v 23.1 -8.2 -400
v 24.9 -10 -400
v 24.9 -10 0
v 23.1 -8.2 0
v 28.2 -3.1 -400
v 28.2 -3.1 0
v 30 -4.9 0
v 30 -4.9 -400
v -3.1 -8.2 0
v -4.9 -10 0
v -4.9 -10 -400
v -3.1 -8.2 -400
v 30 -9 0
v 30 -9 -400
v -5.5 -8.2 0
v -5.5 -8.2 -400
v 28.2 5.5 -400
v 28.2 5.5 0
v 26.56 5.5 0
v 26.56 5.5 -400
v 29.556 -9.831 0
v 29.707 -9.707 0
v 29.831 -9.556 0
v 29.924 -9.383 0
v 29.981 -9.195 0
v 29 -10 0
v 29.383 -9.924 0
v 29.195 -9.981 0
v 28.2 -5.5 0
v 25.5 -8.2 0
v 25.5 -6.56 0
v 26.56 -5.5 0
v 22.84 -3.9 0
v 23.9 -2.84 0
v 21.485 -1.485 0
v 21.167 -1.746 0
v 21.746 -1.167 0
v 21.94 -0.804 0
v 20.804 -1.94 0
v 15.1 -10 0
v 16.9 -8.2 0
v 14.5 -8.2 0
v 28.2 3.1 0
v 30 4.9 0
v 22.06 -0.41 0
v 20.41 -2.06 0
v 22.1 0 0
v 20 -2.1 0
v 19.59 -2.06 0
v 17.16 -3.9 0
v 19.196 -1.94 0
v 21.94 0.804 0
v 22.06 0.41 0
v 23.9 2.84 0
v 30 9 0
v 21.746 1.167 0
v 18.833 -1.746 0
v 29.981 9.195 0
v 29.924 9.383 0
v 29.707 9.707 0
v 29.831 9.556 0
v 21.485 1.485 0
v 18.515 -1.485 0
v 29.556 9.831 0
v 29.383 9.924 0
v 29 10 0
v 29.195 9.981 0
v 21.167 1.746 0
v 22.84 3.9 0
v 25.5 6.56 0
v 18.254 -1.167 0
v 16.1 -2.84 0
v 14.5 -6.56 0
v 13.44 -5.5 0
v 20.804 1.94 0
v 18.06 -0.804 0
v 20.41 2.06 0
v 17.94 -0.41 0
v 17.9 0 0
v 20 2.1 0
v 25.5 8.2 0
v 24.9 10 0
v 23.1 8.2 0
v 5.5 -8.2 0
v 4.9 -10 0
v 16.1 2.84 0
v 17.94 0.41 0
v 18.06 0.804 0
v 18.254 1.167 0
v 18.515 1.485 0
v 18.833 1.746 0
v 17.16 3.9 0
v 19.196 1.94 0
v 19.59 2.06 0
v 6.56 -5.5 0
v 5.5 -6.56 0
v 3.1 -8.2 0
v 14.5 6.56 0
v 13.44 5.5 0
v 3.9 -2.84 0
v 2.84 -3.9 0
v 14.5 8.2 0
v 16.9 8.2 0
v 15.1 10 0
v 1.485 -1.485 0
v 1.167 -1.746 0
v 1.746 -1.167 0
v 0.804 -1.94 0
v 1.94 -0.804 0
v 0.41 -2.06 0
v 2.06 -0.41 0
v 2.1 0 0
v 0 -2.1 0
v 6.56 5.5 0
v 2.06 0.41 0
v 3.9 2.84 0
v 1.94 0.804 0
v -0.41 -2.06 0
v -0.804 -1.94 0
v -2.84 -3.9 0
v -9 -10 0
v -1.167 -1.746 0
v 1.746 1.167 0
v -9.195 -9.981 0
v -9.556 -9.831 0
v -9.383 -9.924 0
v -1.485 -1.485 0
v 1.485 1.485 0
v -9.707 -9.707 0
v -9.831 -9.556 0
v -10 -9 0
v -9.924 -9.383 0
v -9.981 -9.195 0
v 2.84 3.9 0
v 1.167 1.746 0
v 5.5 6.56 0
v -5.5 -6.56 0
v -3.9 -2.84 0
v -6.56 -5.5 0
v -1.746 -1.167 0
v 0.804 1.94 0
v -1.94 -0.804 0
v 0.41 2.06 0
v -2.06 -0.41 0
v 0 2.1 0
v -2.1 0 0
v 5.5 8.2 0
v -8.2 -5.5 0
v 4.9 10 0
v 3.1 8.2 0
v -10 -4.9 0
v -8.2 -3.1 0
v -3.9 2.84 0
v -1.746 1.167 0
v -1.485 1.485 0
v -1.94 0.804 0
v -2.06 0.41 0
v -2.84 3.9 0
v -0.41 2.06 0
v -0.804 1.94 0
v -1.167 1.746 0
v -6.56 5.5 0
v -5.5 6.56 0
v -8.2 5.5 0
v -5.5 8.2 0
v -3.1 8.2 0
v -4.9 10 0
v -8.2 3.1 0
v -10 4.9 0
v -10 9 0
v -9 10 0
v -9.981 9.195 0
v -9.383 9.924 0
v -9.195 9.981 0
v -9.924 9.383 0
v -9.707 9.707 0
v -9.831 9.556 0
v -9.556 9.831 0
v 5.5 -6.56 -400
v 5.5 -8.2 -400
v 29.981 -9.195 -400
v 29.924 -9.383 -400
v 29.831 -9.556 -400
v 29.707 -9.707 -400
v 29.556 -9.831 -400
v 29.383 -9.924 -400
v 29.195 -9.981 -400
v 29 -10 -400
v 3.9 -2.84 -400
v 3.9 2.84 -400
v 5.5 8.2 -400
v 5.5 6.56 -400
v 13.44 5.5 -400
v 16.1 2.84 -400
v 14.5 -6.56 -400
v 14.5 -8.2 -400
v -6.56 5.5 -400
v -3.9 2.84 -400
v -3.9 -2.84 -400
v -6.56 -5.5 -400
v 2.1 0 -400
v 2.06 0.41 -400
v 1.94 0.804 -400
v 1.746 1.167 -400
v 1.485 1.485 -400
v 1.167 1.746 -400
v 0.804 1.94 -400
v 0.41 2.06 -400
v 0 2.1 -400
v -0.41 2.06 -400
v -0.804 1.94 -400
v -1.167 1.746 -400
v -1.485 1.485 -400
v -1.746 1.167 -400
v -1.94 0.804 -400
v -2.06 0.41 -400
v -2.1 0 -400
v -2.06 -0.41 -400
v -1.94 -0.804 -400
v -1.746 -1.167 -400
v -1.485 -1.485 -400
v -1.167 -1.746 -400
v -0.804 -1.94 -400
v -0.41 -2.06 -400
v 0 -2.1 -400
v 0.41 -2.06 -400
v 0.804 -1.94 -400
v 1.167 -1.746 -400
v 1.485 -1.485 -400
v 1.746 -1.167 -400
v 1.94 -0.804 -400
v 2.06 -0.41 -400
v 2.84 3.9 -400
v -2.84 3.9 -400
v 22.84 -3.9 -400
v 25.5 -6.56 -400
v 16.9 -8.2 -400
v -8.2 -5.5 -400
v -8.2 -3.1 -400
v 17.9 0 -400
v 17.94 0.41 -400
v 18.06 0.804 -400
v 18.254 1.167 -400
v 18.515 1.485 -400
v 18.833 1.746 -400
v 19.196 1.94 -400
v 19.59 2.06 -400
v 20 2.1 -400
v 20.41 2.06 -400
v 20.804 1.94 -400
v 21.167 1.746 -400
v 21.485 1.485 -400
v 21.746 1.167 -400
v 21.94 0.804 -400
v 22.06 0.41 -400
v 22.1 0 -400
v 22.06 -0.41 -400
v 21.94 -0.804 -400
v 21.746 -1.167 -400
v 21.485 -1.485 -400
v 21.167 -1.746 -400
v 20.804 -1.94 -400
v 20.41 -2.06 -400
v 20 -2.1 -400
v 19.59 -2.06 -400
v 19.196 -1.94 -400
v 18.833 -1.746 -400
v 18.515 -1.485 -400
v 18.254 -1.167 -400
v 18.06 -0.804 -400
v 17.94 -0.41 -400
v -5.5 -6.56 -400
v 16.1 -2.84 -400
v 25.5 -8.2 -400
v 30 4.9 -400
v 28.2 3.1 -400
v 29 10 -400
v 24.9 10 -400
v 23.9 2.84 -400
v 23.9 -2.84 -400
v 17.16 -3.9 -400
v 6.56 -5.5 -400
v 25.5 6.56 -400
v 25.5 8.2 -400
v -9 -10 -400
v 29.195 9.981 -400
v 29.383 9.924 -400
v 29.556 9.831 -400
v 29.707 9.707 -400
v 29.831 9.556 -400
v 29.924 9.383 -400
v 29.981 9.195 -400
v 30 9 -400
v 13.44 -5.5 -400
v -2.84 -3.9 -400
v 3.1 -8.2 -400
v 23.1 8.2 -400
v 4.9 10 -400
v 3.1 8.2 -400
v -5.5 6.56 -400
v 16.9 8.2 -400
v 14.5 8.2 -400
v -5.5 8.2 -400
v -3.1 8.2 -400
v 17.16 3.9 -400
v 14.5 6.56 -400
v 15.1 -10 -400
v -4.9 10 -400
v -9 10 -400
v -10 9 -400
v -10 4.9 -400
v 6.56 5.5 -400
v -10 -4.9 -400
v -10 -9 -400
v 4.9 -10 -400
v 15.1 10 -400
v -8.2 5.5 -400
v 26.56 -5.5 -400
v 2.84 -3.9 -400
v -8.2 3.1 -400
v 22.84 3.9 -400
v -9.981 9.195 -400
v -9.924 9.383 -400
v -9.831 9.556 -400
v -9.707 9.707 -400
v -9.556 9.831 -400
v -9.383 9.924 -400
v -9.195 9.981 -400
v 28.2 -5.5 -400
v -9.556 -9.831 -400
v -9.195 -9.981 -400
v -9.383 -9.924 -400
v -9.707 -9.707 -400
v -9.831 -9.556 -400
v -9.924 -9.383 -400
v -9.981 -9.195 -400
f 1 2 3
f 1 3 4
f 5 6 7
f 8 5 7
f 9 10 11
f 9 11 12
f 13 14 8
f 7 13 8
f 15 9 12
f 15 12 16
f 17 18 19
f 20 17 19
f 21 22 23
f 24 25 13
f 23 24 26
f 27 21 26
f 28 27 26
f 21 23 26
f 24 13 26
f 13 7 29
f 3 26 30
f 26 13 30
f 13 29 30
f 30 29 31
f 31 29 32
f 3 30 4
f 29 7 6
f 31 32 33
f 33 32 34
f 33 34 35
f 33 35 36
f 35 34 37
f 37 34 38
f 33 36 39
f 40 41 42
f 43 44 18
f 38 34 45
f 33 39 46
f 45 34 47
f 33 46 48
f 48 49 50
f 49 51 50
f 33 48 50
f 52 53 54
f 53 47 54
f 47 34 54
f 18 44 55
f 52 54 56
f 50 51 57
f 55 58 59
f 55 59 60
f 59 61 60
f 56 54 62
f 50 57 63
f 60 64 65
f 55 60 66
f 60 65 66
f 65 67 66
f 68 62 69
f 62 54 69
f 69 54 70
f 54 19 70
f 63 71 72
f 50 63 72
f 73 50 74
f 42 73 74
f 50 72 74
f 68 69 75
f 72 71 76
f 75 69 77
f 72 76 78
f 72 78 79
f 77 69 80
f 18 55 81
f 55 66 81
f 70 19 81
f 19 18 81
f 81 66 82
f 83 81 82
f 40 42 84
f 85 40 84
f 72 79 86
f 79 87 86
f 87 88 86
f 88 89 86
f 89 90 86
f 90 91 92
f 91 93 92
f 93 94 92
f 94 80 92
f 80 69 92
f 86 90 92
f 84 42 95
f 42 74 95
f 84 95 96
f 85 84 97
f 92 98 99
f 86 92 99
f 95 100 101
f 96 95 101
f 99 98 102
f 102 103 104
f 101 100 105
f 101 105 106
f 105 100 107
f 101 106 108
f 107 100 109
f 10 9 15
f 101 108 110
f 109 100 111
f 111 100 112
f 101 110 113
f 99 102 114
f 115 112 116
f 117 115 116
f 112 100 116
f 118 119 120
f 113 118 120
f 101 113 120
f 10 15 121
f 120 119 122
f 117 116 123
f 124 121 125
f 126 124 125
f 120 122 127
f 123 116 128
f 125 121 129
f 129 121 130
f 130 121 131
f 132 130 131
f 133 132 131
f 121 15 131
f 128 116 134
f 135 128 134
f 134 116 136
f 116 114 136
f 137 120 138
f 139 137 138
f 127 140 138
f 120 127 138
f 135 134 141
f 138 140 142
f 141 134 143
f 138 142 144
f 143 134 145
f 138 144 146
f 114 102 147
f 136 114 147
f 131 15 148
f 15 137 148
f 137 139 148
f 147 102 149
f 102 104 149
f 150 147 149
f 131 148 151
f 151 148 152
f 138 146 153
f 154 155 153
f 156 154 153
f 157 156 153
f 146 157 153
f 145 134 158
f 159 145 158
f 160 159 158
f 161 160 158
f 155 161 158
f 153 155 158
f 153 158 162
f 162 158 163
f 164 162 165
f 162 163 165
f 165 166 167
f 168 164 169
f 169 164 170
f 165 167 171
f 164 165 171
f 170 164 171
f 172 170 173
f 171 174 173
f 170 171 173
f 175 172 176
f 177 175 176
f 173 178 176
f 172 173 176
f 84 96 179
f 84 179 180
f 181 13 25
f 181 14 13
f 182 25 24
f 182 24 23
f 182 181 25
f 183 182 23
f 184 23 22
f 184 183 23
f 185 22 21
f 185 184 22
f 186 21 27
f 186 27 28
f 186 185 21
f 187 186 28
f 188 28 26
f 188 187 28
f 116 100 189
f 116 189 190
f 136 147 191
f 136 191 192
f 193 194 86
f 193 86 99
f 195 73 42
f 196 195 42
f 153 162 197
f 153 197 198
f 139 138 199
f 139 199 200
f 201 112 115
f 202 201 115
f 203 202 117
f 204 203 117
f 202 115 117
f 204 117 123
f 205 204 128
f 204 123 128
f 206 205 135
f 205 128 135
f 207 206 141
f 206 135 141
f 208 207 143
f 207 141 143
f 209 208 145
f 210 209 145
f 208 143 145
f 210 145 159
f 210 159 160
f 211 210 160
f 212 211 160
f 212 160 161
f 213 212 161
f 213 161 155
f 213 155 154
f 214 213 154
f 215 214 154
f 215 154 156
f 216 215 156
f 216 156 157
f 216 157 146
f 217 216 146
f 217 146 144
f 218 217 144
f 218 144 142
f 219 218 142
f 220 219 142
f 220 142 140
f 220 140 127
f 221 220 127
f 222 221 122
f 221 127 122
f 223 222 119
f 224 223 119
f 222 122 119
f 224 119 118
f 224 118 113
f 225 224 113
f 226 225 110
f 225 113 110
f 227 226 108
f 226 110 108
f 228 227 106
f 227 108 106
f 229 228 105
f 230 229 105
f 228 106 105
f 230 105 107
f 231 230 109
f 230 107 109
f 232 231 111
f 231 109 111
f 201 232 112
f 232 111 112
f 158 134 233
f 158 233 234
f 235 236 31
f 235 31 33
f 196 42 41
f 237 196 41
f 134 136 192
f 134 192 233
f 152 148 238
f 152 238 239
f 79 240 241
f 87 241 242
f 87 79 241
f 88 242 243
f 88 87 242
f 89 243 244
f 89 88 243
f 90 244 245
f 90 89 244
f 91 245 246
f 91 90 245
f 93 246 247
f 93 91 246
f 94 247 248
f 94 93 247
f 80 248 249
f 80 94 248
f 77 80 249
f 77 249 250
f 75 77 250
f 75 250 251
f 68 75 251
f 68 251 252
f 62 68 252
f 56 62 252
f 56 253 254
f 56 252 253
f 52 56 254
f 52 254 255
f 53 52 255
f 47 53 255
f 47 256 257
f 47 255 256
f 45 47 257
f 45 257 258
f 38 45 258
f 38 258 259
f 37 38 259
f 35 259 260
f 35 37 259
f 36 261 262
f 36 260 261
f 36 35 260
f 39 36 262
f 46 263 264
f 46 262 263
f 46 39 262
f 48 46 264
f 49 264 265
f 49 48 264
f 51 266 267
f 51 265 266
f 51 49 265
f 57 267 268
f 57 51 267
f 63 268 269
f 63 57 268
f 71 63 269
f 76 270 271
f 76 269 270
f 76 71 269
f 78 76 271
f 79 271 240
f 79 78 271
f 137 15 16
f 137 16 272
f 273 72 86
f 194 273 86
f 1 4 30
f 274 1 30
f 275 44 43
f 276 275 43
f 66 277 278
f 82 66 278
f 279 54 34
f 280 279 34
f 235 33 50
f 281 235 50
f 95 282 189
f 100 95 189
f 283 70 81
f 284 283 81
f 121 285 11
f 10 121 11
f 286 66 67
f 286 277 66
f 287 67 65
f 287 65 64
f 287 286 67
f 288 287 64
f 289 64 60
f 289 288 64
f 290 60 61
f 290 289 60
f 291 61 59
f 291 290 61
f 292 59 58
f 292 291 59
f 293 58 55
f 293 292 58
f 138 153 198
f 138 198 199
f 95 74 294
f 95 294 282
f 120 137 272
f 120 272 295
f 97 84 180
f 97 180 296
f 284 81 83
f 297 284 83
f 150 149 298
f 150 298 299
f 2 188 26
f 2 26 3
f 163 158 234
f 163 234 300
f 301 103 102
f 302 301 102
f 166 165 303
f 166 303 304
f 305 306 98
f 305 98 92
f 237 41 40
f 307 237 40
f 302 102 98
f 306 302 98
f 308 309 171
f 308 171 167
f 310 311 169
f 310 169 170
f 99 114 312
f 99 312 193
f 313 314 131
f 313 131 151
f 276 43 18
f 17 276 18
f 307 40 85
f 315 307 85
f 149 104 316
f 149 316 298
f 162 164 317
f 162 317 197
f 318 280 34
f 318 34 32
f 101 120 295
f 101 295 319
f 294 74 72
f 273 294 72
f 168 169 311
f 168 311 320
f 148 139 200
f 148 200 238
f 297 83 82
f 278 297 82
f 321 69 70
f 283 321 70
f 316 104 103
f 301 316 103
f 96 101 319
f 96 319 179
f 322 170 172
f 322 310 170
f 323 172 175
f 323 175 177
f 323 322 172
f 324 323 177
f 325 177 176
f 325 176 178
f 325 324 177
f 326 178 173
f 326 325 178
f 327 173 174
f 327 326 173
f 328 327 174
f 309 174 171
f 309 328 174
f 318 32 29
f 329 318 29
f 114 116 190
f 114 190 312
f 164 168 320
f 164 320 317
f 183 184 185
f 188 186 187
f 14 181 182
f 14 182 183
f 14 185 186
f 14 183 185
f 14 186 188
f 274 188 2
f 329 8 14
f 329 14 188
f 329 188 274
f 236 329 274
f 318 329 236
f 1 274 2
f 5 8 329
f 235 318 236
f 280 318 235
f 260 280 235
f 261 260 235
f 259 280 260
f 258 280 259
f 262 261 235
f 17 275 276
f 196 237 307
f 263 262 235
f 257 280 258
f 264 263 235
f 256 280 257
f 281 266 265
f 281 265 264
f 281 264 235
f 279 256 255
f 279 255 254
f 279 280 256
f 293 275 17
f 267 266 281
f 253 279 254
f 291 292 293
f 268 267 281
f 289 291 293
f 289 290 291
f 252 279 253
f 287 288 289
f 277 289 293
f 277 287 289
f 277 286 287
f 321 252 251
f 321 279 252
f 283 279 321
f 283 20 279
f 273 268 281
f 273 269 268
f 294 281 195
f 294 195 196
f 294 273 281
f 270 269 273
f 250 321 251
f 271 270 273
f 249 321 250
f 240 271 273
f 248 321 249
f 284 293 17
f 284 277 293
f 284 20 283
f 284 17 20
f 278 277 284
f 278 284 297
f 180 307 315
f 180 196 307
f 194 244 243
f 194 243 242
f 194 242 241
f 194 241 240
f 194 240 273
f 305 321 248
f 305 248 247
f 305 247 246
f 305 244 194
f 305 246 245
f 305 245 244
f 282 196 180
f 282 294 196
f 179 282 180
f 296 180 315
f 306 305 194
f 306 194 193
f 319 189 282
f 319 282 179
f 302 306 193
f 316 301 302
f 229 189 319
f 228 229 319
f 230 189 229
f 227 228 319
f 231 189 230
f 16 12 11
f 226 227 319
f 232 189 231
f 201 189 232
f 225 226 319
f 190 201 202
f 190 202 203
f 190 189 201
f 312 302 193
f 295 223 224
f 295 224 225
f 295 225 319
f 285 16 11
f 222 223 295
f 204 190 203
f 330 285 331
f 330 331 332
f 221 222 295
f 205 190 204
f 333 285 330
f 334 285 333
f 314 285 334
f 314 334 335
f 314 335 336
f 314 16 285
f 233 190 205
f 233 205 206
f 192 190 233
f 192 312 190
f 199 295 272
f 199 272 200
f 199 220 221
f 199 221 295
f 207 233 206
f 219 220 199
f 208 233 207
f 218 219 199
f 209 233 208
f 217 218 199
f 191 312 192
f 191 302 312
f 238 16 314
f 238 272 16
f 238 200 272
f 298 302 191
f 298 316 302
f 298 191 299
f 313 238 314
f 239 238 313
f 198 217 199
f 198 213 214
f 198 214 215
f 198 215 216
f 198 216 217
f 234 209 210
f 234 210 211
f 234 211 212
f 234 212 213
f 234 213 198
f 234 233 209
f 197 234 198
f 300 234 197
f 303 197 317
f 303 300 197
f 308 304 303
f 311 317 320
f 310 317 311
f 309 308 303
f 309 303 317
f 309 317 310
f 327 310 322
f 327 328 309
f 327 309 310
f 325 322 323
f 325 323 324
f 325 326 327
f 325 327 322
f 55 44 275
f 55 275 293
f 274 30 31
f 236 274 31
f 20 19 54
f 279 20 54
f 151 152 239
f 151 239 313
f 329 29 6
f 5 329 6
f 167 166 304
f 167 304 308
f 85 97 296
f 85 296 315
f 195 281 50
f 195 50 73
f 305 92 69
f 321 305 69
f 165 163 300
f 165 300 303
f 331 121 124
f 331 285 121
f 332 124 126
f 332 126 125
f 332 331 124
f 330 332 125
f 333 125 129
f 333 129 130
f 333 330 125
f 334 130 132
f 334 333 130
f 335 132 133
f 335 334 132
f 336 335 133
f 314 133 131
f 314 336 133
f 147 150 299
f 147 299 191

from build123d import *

# Parameters (mm, degrees)
SKETCH2_W            = 20
SKETCH2_H            = 20
BOSS_EXTRUDE1_DEPTH  = 400
CUT_EXTRUDE1_DEPTH   = 401.249921924
CIRPATTERN2_COUNT    = 4
SKETCH9_R            = 2.1
CUT_EXTRUDE2_DEPTH   = 401.249921924
MIRROR1_COPY_1_DEPTH = 401.249921924
MIRROR1_COPY_2_DEPTH = 401.249921924
MIRROR1_COPY_3_DEPTH = 401.249921924
CUT_EXTRUDE3_DEPTH   = 402.248052955
FILLET1_R            = 1


with BuildPart() as part:
    # Sketch2 → Boss-Extrude1 (new body)
    with BuildSketch(Plane.XY):
        Rectangle(SKETCH2_W, SKETCH2_H)
    boss_extrude1 = extrude(amount=-BOSS_EXTRUDE1_DEPTH)

    # Sketch3 → Cut-Extrude1 (cut, symmetric)
    with BuildSketch(Plane.XY):
        Polygon((-3.1, 8.2), (-4.9, 10), (4.9, 10), (3.1, 8.2), (5.5, 8.2), (5.5, 6.56), (2.84, 3.9), (-2.84, 3.9), (-5.5, 6.56), (-5.5, 8.2), align=None)
    cut_extrude1 = extrude(amount=CUT_EXTRUDE1_DEPTH, both=True, mode=Mode.SUBTRACT)

    # CirPattern2: Cut-Extrude1 ×4 about axis
    cirpattern2_axis = Axis((0, 0, 0), (0, 0, 1))
    for i in range(1, CIRPATTERN2_COUNT):
        add(cut_extrude1.rotate(cirpattern2_axis, i * 360 / CIRPATTERN2_COUNT), mode=Mode.SUBTRACT)

    # Sketch9 → Cut-Extrude2 (cut, through all)
    with BuildSketch(Plane.XY):
        Circle(SKETCH9_R)
    cut_extrude2 = extrude(amount=-CUT_EXTRUDE2_DEPTH, mode=Mode.SUBTRACT)

    # Mirror1: Boss-Extrude1, Cut-Extrude1, Cut-Extrude2 across plane
    add(boss_extrude1.mirror(Plane(origin=(10, 10, -400), x_dir=(0, 0, 1), z_dir=(1, 0, 0))))
    add(cut_extrude1.mirror(Plane(origin=(10, 10, -400), x_dir=(0, 0, 1), z_dir=(1, 0, 0))), mode=Mode.SUBTRACT)
    add(cut_extrude2.mirror(Plane(origin=(10, 10, -400), x_dir=(0, 0, 1), z_dir=(1, 0, 0))), mode=Mode.SUBTRACT)

    # Mirror1 copy 1 sketch → Mirror1 copy 1 (cut, symmetric)
    with BuildSketch(Plane(origin=(20, 0, 0), x_dir=(0, 1, 0), z_dir=(0, 0, 1))):
        Polygon((-3.1, -8.2), (-4.9, -10), (4.9, -10), (3.1, -8.2), (5.5, -8.2), (5.5, -6.56), (2.84, -3.9), (-2.84, -3.9), (-5.5, -6.56), (-5.5, -8.2), align=None)
    extrude(amount=MIRROR1_COPY_1_DEPTH, both=True, mode=Mode.SUBTRACT)

    # Mirror1 copy 2 sketch → Mirror1 copy 2 (cut, symmetric)
    with BuildSketch(Plane(origin=(20, 0, 0), x_dir=(1, 0, 0), z_dir=(0, 0, 1))):
        Polygon((-3.1, -8.2), (-4.9, -10), (4.9, -10), (3.1, -8.2), (5.5, -8.2), (5.5, -6.56), (2.84, -3.9), (-2.84, -3.9), (-5.5, -6.56), (-5.5, -8.2), align=None)
    extrude(amount=MIRROR1_COPY_2_DEPTH, both=True, mode=Mode.SUBTRACT)

    # Mirror1 copy 3 sketch → Mirror1 copy 3 (cut, symmetric)
    with BuildSketch(Plane(origin=(20, 0, 0), x_dir=(0, -1, 0), z_dir=(0, 0, 1))):
        Polygon((-3.1, -8.2), (-4.9, -10), (4.9, -10), (3.1, -8.2), (5.5, -8.2), (5.5, -6.56), (2.84, -3.9), (-2.84, -3.9), (-5.5, -6.56), (-5.5, -8.2), align=None)
    extrude(amount=MIRROR1_COPY_3_DEPTH, both=True, mode=Mode.SUBTRACT)

    # Sketch10 → Cut-Extrude3 (cut, through all)
    with BuildSketch(Plane.XY):
        Polygon((13.44, -5.5), (11.8, -5.5), (8.2, -5.5), (6.56, -5.5), (6.56, 5.5), (8.2, 5.5), (11.8, 5.5), (13.44, 5.5), align=None)
    extrude(amount=-CUT_EXTRUDE3_DEPTH, mode=Mode.SUBTRACT)

    # Fillet1
    fillet1_edges = [part.edges().sort_by_distance(p)[0] for p in [
        (30, 10, -200),
        (30, -10, -200),
        (-10, 10, -200),
        (-10, -10, -200),
    ]]
    fillet(fillet1_edges, radius=FILLET1_R)


solid = part.part
